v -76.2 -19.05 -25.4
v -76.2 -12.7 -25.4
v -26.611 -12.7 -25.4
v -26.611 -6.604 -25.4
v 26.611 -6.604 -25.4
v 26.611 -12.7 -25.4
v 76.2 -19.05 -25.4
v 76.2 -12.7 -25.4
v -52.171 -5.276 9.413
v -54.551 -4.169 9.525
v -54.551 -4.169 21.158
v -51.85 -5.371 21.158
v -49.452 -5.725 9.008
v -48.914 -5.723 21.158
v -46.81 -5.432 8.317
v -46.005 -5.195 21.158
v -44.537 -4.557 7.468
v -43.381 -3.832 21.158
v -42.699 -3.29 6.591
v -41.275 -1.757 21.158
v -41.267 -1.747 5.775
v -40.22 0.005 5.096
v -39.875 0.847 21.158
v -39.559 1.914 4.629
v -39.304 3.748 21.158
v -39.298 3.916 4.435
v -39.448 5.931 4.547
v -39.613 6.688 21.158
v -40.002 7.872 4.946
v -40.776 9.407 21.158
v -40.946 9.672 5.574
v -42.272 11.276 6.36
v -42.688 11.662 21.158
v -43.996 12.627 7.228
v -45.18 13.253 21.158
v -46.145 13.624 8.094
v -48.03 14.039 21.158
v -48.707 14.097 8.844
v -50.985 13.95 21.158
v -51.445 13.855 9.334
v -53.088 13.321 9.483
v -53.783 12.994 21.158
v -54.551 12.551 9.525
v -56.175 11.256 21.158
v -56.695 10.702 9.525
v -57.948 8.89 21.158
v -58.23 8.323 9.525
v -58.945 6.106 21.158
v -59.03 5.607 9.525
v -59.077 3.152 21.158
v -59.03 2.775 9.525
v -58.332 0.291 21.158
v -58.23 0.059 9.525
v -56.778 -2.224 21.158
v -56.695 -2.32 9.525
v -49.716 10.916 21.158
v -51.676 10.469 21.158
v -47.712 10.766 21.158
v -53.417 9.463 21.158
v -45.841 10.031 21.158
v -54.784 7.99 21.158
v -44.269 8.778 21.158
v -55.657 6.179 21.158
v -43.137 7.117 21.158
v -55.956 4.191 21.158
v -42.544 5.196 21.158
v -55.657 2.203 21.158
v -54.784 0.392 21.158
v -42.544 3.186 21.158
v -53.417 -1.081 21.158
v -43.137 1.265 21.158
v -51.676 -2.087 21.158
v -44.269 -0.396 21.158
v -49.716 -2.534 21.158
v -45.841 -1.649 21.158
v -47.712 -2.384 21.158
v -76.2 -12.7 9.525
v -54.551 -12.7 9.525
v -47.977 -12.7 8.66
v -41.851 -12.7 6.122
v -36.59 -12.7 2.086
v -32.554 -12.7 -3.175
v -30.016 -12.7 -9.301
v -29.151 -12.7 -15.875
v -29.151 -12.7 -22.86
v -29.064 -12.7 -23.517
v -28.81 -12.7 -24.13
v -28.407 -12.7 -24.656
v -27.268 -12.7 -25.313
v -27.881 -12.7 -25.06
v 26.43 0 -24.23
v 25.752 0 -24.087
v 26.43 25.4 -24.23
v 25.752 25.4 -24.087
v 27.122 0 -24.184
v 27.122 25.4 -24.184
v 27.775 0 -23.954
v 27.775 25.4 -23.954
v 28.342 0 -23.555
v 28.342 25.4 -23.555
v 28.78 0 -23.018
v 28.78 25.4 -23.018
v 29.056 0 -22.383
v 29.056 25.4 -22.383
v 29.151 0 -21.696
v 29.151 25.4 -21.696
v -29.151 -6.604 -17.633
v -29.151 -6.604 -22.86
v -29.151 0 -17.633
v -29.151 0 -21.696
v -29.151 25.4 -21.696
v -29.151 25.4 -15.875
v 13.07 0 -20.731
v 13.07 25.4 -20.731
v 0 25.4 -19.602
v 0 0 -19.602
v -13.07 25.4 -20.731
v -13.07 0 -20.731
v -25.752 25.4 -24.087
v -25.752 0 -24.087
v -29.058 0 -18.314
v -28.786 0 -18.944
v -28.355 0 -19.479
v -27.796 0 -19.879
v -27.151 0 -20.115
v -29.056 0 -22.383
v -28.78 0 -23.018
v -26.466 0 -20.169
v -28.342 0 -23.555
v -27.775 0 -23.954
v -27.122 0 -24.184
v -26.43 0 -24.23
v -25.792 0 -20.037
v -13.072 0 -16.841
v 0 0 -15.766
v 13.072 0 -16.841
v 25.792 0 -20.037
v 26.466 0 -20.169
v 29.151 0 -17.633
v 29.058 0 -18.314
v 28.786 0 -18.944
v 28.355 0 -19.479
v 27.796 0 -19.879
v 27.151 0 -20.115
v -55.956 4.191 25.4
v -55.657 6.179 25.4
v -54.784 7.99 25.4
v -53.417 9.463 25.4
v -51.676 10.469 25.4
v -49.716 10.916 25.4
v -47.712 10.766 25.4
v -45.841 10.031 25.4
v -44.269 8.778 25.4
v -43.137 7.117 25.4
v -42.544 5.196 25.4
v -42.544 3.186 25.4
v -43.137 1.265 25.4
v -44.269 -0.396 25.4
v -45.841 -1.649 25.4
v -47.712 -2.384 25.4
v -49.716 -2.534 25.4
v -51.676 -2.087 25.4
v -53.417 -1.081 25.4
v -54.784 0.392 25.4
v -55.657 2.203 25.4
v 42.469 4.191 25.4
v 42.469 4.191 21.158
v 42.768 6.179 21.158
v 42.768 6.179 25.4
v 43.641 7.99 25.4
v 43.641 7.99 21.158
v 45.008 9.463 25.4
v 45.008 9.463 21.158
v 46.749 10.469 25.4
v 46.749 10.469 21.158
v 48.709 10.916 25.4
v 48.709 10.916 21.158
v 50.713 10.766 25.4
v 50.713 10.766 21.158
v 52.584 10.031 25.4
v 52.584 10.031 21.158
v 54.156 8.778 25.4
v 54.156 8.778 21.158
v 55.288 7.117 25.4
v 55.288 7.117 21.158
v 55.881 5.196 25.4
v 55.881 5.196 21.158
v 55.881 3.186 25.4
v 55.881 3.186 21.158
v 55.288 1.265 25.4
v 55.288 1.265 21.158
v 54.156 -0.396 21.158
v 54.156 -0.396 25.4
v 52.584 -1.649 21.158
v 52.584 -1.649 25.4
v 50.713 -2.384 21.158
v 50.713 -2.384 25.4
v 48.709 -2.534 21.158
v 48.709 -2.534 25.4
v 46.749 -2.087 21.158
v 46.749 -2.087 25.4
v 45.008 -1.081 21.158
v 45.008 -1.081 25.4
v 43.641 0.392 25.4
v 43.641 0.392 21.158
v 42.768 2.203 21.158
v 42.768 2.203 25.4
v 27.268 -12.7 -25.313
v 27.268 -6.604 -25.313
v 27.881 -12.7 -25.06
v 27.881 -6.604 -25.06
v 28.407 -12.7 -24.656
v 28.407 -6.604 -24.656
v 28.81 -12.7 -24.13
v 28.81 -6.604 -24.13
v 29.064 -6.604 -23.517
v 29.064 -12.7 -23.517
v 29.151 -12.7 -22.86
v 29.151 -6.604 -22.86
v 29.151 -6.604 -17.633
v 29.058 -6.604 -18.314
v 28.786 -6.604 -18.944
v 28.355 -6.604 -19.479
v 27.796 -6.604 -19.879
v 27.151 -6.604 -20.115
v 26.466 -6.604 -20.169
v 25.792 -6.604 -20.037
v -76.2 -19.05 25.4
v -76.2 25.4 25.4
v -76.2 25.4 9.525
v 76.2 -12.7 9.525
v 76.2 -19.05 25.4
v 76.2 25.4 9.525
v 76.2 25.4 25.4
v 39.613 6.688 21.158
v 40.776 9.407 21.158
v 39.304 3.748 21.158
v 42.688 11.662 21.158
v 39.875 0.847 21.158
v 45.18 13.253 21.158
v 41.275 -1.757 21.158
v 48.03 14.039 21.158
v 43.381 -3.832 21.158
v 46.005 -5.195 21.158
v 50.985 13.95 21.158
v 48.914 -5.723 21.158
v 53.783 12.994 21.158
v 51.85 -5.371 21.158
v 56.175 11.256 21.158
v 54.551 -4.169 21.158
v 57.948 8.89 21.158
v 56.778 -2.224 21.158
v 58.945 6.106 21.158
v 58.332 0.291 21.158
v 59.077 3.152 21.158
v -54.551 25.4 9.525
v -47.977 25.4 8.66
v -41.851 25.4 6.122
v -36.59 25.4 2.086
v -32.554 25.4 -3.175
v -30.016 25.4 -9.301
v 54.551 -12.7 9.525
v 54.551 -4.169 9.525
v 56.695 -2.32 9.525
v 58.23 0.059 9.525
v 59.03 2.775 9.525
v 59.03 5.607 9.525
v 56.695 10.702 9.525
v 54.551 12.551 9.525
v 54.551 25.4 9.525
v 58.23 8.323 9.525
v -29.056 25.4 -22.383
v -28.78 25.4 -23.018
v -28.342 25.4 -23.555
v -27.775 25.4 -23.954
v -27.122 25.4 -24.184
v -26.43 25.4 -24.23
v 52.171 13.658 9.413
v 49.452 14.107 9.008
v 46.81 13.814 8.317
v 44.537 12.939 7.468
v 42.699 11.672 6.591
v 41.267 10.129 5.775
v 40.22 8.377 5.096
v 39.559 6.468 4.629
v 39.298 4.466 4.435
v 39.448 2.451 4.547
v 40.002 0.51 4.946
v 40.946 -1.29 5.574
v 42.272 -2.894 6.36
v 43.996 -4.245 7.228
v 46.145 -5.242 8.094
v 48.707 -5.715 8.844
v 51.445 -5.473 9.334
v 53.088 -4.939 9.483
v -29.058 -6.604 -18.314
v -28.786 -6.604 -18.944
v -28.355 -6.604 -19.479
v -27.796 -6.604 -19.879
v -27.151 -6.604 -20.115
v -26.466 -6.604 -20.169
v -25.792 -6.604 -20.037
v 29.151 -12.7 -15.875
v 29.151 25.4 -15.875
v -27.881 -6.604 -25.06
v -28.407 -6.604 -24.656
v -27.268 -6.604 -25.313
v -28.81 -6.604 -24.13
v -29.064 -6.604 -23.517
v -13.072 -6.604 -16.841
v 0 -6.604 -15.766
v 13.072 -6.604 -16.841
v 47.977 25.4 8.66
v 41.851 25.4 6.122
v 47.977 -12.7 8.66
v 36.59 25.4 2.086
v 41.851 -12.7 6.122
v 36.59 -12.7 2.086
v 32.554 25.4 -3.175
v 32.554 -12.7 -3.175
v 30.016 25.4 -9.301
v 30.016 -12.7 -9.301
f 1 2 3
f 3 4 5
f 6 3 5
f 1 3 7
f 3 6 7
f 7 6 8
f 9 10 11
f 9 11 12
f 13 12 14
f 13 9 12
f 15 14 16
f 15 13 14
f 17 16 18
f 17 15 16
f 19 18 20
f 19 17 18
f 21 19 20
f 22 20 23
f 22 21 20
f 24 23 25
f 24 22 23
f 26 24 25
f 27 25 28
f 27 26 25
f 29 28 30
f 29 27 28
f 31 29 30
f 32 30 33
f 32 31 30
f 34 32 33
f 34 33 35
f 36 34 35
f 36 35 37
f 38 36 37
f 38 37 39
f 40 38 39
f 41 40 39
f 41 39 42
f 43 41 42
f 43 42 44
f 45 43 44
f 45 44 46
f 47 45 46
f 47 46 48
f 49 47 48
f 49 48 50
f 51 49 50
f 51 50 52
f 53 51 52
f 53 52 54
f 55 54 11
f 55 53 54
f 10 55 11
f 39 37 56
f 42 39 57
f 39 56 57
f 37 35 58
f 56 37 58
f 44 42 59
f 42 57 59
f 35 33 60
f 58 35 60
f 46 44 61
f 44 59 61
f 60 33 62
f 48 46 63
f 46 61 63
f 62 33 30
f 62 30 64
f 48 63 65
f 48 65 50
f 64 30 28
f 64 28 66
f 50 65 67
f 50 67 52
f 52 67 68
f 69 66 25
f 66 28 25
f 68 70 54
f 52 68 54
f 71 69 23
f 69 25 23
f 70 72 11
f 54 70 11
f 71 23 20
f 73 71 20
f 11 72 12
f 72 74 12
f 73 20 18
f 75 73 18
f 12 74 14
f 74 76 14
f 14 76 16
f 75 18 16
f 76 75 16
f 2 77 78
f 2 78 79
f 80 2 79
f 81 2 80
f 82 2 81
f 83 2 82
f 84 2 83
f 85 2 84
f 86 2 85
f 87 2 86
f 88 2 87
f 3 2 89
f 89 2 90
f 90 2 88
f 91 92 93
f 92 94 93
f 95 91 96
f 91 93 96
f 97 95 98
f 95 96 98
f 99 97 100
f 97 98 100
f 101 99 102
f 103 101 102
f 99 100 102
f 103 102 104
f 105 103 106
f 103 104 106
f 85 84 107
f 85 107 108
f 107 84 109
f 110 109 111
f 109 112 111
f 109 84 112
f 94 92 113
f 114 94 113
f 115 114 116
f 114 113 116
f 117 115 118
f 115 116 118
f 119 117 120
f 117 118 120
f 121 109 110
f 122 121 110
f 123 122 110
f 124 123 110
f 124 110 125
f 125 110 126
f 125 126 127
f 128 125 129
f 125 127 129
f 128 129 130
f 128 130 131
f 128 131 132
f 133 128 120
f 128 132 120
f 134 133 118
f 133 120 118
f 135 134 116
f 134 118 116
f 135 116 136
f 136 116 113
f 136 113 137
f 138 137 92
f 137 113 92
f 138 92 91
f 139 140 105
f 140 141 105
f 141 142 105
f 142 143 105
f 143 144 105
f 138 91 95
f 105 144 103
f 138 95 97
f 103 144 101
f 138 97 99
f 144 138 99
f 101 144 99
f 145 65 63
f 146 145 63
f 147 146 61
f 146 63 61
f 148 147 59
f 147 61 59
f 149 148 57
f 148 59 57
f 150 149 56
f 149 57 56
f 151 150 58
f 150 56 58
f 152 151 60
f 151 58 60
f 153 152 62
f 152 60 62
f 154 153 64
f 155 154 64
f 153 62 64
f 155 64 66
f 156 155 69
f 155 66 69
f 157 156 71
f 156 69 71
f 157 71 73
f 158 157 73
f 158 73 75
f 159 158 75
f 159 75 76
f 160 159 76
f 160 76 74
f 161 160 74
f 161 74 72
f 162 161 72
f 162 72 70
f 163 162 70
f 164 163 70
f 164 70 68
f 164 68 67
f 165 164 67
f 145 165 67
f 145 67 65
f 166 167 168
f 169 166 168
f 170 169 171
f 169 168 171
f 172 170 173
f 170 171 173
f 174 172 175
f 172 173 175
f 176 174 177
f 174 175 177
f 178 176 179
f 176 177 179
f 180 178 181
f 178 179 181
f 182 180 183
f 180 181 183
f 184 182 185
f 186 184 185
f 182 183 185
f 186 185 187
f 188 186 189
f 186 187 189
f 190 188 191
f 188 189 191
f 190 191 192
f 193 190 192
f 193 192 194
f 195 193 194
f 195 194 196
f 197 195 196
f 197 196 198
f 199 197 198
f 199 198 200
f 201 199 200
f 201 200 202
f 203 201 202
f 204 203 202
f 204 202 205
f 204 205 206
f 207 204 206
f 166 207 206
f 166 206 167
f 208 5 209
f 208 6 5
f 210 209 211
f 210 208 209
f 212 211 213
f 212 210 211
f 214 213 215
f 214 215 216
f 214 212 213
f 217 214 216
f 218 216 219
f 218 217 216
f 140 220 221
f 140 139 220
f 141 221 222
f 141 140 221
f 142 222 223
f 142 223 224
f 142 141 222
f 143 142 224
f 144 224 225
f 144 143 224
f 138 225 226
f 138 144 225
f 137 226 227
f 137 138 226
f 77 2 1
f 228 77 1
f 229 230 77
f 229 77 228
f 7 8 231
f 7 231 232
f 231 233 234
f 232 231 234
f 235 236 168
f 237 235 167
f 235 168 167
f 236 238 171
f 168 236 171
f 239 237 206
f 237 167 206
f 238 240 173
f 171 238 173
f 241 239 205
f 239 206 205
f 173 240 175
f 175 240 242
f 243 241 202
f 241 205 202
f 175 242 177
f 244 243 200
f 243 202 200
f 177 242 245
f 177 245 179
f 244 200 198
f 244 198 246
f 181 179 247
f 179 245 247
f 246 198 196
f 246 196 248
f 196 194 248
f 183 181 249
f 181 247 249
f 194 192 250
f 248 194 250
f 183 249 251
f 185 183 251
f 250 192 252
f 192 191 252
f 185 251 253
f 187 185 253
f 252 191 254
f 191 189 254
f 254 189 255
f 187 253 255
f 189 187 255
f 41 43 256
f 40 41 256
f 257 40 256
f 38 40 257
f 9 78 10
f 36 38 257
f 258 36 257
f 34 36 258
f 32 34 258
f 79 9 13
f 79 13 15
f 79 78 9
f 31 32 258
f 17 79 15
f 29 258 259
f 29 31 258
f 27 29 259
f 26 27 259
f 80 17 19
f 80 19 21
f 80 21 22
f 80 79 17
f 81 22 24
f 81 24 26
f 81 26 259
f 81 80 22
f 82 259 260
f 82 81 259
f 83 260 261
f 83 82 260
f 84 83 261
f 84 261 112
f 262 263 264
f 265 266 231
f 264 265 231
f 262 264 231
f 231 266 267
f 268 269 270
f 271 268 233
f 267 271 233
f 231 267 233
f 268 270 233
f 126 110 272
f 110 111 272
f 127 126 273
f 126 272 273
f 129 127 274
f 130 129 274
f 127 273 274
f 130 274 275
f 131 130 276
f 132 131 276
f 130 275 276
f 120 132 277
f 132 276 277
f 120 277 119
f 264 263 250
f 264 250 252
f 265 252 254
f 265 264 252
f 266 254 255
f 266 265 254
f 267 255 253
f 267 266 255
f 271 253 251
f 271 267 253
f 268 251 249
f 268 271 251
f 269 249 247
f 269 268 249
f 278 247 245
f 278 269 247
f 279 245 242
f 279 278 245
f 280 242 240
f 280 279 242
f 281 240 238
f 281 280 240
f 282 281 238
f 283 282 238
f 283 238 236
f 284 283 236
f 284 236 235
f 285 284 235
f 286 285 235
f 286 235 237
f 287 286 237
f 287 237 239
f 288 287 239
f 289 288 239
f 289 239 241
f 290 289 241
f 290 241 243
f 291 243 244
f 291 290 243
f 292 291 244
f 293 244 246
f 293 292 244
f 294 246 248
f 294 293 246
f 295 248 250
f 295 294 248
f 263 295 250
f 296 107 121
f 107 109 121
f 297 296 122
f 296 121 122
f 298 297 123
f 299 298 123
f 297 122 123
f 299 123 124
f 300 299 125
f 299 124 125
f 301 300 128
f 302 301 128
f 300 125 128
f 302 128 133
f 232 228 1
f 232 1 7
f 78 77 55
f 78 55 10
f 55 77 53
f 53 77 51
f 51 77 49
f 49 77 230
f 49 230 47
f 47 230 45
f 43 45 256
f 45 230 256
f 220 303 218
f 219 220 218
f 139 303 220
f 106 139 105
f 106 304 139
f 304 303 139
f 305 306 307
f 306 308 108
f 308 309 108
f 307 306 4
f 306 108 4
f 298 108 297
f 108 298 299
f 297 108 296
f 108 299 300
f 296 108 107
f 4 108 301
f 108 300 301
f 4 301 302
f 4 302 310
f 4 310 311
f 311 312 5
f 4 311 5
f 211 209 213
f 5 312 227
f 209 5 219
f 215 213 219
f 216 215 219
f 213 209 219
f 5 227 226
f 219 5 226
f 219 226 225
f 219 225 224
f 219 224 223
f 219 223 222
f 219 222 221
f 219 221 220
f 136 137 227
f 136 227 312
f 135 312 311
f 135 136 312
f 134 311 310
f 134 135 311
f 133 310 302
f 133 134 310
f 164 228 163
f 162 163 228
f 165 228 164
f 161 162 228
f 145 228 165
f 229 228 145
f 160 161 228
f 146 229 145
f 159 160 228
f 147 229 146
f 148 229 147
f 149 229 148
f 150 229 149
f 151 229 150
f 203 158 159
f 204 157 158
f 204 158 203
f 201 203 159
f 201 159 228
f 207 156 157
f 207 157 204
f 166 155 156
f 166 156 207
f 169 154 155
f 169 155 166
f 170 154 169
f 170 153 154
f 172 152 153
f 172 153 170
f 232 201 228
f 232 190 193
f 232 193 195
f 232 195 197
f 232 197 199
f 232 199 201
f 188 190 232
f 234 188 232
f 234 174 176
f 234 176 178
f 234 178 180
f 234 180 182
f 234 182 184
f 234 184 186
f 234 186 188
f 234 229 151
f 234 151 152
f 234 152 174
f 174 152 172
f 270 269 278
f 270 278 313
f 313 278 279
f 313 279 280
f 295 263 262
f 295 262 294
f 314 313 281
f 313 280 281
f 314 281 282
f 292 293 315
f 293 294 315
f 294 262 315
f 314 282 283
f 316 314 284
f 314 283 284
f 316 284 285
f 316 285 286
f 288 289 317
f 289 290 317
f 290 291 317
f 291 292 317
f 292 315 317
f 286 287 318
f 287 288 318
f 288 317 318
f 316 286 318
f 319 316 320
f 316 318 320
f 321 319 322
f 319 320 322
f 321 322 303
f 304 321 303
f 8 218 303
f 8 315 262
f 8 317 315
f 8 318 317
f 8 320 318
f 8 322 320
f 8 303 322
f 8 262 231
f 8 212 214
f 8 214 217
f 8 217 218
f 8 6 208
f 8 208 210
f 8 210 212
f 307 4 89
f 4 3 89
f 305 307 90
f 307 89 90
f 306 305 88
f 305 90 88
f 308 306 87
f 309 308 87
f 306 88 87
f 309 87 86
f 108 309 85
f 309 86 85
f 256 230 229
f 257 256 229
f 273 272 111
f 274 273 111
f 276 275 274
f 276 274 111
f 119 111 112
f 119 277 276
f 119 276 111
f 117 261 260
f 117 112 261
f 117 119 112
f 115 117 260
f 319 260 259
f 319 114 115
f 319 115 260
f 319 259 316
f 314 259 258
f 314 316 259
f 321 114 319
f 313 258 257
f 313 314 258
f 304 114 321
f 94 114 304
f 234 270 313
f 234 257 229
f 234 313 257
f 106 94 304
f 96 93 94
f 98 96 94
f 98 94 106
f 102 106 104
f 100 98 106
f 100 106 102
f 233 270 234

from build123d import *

# Parameters (mm, degrees)
BOSS_EXTRUDE1_DEPTH     = 25.4
BOSS_EXTRUDE2_DEPTH     = 6.604
SKETCH3_W               = 152.4
SKETCH3_H               = 50.8
BOSS_EXTRUDE3_DEPTH     = 12.446
SKETCH5_W               = 47.049242613
SKETCH5_H               = 34.925
CUT_EXTRUDE1_DEPTH      = 38.1
FILLET1_R               = 2.54
FILLET2_R               = 25.4
CUT_EXTRUDE2_DEPTH      = 11.6332
CUT_EXTRUDE2_DEPTH_BACK = 85.242269675
CUT_EXTRUDE2_START      = 9.525
SKETCH6_R               = 9.9187
SKETCH7_R               = 6.7437
CUT_EXTRUDE3_DEPTH      = 93.840002113


with BuildPart() as part:
    # Sketch1 → Boss-Extrude1 (new body)
    with BuildSketch(Plane(origin=(0, 0, 0), x_dir=(1, 0, 0), z_dir=(0, 1, 0))):
        with BuildLine():
            Line((76.2, -25.4), (76.2, 25.4))
            Line((76.2, 25.4), (29.150757387, 25.4))
            ThreePointArc((29.150757387, 25.4), (0, 19.601553837), (-29.150757387, 25.4))
            Line((-29.150757387, 25.4), (-76.2, 25.4))
            Line((-76.2, 25.4), (-76.2, -25.4))
            Line((-76.2, -25.4), (76.2, -25.4))
        make_face()
    extrude(amount=BOSS_EXTRUDE1_DEPTH)

    # Sketch2 → Boss-Extrude2 (add)
    with BuildSketch(Plane.XZ):
        with BuildLine():
            Line((-76.2, 25.4), (76.2, 25.4))
            Line((76.2, 25.4), (76.2, -21.59))
            Line((76.2, -21.59), (29.966893046, -21.59))
            ThreePointArc((29.966893046, -21.59), (0, -15.766153837), (-29.966893046, -21.59))
            Line((-29.966893046, -21.59), (-76.2, -21.59))
            Line((-76.2, -21.59), (-76.2, 25.4))
        make_face()
    extrude(amount=BOSS_EXTRUDE2_DEPTH)

    # Sketch3 → Boss-Extrude3 (add)
    with BuildSketch(Plane.XZ.offset(6.604)):
        Rectangle(SKETCH3_W, SKETCH3_H)
    extrude(amount=BOSS_EXTRUDE3_DEPTH)

    # Sketch5 → Cut-Extrude1 (cut)
    with BuildSketch(Plane(origin=(0, 25.4, 0), x_dir=(1, 0, 0), z_dir=(0, 1, 0))):
        with Locations((-52.675378694, 7.9375)):
            Rectangle(SKETCH5_W, SKETCH5_H)
        with Locations((52.675378694, 7.9375)):
            Rectangle(SKETCH5_W, SKETCH5_H)
    extrude(amount=-CUT_EXTRUDE1_DEPTH, mode=Mode.SUBTRACT)

    # Fillet1
    fillet1_edges = [part.edges().sort_by_distance(p)[0] for p in [
        (29.150757387, 12.7, -25.4),
        (-29.150757387, 12.7, -25.4),
        (-29.150757387, -9.652, -25.4),
        (-29.150757387, -3.302, -21.265527456),
        (29.150757387, -9.652, -25.4),
        (29.150757387, -3.302, -21.265527456),
    ]]
    fillet(fillet1_edges, radius=FILLET1_R)

    # Fillet2
    fillet2_edges = [part.edges().sort_by_distance(p)[0] for p in [
        (-29.150757387, 6.35, 9.525),
        (29.150757387, 6.35, 9.525),
    ]]
    fillet(fillet2_edges, radius=FILLET2_R)

    # Sketch6 → Cut-Extrude2 (cut, two sides: drawn at the far end of the back side and taken through both)
    with BuildSketch(Plane.XY.offset(CUT_EXTRUDE2_START - CUT_EXTRUDE2_DEPTH_BACK)):
        with Locations(Location((49.2125, 4.191, 0), (0, 0, 302.561278337))):
            Circle(SKETCH6_R)
        with Locations(Location((-49.2125, 4.191, 0), (0, 0, 237.438721663))):
            Circle(SKETCH6_R)
    extrude(amount=CUT_EXTRUDE2_DEPTH + CUT_EXTRUDE2_DEPTH_BACK, mode=Mode.SUBTRACT)

    # Sketch7 → Cut-Extrude3 (cut, through all)
    with BuildSketch(Plane(origin=(0, 0, 21.1582), x_dir=(-1, 0, 0), z_dir=(0, 0, -1))):
        with Locations((-49.2125, 4.191)):
            Circle(SKETCH7_R)
        with Locations((49.2125, 4.191)):
            Circle(SKETCH7_R)
    extrude(amount=-CUT_EXTRUDE3_DEPTH, mode=Mode.SUBTRACT)


solid = part.part
